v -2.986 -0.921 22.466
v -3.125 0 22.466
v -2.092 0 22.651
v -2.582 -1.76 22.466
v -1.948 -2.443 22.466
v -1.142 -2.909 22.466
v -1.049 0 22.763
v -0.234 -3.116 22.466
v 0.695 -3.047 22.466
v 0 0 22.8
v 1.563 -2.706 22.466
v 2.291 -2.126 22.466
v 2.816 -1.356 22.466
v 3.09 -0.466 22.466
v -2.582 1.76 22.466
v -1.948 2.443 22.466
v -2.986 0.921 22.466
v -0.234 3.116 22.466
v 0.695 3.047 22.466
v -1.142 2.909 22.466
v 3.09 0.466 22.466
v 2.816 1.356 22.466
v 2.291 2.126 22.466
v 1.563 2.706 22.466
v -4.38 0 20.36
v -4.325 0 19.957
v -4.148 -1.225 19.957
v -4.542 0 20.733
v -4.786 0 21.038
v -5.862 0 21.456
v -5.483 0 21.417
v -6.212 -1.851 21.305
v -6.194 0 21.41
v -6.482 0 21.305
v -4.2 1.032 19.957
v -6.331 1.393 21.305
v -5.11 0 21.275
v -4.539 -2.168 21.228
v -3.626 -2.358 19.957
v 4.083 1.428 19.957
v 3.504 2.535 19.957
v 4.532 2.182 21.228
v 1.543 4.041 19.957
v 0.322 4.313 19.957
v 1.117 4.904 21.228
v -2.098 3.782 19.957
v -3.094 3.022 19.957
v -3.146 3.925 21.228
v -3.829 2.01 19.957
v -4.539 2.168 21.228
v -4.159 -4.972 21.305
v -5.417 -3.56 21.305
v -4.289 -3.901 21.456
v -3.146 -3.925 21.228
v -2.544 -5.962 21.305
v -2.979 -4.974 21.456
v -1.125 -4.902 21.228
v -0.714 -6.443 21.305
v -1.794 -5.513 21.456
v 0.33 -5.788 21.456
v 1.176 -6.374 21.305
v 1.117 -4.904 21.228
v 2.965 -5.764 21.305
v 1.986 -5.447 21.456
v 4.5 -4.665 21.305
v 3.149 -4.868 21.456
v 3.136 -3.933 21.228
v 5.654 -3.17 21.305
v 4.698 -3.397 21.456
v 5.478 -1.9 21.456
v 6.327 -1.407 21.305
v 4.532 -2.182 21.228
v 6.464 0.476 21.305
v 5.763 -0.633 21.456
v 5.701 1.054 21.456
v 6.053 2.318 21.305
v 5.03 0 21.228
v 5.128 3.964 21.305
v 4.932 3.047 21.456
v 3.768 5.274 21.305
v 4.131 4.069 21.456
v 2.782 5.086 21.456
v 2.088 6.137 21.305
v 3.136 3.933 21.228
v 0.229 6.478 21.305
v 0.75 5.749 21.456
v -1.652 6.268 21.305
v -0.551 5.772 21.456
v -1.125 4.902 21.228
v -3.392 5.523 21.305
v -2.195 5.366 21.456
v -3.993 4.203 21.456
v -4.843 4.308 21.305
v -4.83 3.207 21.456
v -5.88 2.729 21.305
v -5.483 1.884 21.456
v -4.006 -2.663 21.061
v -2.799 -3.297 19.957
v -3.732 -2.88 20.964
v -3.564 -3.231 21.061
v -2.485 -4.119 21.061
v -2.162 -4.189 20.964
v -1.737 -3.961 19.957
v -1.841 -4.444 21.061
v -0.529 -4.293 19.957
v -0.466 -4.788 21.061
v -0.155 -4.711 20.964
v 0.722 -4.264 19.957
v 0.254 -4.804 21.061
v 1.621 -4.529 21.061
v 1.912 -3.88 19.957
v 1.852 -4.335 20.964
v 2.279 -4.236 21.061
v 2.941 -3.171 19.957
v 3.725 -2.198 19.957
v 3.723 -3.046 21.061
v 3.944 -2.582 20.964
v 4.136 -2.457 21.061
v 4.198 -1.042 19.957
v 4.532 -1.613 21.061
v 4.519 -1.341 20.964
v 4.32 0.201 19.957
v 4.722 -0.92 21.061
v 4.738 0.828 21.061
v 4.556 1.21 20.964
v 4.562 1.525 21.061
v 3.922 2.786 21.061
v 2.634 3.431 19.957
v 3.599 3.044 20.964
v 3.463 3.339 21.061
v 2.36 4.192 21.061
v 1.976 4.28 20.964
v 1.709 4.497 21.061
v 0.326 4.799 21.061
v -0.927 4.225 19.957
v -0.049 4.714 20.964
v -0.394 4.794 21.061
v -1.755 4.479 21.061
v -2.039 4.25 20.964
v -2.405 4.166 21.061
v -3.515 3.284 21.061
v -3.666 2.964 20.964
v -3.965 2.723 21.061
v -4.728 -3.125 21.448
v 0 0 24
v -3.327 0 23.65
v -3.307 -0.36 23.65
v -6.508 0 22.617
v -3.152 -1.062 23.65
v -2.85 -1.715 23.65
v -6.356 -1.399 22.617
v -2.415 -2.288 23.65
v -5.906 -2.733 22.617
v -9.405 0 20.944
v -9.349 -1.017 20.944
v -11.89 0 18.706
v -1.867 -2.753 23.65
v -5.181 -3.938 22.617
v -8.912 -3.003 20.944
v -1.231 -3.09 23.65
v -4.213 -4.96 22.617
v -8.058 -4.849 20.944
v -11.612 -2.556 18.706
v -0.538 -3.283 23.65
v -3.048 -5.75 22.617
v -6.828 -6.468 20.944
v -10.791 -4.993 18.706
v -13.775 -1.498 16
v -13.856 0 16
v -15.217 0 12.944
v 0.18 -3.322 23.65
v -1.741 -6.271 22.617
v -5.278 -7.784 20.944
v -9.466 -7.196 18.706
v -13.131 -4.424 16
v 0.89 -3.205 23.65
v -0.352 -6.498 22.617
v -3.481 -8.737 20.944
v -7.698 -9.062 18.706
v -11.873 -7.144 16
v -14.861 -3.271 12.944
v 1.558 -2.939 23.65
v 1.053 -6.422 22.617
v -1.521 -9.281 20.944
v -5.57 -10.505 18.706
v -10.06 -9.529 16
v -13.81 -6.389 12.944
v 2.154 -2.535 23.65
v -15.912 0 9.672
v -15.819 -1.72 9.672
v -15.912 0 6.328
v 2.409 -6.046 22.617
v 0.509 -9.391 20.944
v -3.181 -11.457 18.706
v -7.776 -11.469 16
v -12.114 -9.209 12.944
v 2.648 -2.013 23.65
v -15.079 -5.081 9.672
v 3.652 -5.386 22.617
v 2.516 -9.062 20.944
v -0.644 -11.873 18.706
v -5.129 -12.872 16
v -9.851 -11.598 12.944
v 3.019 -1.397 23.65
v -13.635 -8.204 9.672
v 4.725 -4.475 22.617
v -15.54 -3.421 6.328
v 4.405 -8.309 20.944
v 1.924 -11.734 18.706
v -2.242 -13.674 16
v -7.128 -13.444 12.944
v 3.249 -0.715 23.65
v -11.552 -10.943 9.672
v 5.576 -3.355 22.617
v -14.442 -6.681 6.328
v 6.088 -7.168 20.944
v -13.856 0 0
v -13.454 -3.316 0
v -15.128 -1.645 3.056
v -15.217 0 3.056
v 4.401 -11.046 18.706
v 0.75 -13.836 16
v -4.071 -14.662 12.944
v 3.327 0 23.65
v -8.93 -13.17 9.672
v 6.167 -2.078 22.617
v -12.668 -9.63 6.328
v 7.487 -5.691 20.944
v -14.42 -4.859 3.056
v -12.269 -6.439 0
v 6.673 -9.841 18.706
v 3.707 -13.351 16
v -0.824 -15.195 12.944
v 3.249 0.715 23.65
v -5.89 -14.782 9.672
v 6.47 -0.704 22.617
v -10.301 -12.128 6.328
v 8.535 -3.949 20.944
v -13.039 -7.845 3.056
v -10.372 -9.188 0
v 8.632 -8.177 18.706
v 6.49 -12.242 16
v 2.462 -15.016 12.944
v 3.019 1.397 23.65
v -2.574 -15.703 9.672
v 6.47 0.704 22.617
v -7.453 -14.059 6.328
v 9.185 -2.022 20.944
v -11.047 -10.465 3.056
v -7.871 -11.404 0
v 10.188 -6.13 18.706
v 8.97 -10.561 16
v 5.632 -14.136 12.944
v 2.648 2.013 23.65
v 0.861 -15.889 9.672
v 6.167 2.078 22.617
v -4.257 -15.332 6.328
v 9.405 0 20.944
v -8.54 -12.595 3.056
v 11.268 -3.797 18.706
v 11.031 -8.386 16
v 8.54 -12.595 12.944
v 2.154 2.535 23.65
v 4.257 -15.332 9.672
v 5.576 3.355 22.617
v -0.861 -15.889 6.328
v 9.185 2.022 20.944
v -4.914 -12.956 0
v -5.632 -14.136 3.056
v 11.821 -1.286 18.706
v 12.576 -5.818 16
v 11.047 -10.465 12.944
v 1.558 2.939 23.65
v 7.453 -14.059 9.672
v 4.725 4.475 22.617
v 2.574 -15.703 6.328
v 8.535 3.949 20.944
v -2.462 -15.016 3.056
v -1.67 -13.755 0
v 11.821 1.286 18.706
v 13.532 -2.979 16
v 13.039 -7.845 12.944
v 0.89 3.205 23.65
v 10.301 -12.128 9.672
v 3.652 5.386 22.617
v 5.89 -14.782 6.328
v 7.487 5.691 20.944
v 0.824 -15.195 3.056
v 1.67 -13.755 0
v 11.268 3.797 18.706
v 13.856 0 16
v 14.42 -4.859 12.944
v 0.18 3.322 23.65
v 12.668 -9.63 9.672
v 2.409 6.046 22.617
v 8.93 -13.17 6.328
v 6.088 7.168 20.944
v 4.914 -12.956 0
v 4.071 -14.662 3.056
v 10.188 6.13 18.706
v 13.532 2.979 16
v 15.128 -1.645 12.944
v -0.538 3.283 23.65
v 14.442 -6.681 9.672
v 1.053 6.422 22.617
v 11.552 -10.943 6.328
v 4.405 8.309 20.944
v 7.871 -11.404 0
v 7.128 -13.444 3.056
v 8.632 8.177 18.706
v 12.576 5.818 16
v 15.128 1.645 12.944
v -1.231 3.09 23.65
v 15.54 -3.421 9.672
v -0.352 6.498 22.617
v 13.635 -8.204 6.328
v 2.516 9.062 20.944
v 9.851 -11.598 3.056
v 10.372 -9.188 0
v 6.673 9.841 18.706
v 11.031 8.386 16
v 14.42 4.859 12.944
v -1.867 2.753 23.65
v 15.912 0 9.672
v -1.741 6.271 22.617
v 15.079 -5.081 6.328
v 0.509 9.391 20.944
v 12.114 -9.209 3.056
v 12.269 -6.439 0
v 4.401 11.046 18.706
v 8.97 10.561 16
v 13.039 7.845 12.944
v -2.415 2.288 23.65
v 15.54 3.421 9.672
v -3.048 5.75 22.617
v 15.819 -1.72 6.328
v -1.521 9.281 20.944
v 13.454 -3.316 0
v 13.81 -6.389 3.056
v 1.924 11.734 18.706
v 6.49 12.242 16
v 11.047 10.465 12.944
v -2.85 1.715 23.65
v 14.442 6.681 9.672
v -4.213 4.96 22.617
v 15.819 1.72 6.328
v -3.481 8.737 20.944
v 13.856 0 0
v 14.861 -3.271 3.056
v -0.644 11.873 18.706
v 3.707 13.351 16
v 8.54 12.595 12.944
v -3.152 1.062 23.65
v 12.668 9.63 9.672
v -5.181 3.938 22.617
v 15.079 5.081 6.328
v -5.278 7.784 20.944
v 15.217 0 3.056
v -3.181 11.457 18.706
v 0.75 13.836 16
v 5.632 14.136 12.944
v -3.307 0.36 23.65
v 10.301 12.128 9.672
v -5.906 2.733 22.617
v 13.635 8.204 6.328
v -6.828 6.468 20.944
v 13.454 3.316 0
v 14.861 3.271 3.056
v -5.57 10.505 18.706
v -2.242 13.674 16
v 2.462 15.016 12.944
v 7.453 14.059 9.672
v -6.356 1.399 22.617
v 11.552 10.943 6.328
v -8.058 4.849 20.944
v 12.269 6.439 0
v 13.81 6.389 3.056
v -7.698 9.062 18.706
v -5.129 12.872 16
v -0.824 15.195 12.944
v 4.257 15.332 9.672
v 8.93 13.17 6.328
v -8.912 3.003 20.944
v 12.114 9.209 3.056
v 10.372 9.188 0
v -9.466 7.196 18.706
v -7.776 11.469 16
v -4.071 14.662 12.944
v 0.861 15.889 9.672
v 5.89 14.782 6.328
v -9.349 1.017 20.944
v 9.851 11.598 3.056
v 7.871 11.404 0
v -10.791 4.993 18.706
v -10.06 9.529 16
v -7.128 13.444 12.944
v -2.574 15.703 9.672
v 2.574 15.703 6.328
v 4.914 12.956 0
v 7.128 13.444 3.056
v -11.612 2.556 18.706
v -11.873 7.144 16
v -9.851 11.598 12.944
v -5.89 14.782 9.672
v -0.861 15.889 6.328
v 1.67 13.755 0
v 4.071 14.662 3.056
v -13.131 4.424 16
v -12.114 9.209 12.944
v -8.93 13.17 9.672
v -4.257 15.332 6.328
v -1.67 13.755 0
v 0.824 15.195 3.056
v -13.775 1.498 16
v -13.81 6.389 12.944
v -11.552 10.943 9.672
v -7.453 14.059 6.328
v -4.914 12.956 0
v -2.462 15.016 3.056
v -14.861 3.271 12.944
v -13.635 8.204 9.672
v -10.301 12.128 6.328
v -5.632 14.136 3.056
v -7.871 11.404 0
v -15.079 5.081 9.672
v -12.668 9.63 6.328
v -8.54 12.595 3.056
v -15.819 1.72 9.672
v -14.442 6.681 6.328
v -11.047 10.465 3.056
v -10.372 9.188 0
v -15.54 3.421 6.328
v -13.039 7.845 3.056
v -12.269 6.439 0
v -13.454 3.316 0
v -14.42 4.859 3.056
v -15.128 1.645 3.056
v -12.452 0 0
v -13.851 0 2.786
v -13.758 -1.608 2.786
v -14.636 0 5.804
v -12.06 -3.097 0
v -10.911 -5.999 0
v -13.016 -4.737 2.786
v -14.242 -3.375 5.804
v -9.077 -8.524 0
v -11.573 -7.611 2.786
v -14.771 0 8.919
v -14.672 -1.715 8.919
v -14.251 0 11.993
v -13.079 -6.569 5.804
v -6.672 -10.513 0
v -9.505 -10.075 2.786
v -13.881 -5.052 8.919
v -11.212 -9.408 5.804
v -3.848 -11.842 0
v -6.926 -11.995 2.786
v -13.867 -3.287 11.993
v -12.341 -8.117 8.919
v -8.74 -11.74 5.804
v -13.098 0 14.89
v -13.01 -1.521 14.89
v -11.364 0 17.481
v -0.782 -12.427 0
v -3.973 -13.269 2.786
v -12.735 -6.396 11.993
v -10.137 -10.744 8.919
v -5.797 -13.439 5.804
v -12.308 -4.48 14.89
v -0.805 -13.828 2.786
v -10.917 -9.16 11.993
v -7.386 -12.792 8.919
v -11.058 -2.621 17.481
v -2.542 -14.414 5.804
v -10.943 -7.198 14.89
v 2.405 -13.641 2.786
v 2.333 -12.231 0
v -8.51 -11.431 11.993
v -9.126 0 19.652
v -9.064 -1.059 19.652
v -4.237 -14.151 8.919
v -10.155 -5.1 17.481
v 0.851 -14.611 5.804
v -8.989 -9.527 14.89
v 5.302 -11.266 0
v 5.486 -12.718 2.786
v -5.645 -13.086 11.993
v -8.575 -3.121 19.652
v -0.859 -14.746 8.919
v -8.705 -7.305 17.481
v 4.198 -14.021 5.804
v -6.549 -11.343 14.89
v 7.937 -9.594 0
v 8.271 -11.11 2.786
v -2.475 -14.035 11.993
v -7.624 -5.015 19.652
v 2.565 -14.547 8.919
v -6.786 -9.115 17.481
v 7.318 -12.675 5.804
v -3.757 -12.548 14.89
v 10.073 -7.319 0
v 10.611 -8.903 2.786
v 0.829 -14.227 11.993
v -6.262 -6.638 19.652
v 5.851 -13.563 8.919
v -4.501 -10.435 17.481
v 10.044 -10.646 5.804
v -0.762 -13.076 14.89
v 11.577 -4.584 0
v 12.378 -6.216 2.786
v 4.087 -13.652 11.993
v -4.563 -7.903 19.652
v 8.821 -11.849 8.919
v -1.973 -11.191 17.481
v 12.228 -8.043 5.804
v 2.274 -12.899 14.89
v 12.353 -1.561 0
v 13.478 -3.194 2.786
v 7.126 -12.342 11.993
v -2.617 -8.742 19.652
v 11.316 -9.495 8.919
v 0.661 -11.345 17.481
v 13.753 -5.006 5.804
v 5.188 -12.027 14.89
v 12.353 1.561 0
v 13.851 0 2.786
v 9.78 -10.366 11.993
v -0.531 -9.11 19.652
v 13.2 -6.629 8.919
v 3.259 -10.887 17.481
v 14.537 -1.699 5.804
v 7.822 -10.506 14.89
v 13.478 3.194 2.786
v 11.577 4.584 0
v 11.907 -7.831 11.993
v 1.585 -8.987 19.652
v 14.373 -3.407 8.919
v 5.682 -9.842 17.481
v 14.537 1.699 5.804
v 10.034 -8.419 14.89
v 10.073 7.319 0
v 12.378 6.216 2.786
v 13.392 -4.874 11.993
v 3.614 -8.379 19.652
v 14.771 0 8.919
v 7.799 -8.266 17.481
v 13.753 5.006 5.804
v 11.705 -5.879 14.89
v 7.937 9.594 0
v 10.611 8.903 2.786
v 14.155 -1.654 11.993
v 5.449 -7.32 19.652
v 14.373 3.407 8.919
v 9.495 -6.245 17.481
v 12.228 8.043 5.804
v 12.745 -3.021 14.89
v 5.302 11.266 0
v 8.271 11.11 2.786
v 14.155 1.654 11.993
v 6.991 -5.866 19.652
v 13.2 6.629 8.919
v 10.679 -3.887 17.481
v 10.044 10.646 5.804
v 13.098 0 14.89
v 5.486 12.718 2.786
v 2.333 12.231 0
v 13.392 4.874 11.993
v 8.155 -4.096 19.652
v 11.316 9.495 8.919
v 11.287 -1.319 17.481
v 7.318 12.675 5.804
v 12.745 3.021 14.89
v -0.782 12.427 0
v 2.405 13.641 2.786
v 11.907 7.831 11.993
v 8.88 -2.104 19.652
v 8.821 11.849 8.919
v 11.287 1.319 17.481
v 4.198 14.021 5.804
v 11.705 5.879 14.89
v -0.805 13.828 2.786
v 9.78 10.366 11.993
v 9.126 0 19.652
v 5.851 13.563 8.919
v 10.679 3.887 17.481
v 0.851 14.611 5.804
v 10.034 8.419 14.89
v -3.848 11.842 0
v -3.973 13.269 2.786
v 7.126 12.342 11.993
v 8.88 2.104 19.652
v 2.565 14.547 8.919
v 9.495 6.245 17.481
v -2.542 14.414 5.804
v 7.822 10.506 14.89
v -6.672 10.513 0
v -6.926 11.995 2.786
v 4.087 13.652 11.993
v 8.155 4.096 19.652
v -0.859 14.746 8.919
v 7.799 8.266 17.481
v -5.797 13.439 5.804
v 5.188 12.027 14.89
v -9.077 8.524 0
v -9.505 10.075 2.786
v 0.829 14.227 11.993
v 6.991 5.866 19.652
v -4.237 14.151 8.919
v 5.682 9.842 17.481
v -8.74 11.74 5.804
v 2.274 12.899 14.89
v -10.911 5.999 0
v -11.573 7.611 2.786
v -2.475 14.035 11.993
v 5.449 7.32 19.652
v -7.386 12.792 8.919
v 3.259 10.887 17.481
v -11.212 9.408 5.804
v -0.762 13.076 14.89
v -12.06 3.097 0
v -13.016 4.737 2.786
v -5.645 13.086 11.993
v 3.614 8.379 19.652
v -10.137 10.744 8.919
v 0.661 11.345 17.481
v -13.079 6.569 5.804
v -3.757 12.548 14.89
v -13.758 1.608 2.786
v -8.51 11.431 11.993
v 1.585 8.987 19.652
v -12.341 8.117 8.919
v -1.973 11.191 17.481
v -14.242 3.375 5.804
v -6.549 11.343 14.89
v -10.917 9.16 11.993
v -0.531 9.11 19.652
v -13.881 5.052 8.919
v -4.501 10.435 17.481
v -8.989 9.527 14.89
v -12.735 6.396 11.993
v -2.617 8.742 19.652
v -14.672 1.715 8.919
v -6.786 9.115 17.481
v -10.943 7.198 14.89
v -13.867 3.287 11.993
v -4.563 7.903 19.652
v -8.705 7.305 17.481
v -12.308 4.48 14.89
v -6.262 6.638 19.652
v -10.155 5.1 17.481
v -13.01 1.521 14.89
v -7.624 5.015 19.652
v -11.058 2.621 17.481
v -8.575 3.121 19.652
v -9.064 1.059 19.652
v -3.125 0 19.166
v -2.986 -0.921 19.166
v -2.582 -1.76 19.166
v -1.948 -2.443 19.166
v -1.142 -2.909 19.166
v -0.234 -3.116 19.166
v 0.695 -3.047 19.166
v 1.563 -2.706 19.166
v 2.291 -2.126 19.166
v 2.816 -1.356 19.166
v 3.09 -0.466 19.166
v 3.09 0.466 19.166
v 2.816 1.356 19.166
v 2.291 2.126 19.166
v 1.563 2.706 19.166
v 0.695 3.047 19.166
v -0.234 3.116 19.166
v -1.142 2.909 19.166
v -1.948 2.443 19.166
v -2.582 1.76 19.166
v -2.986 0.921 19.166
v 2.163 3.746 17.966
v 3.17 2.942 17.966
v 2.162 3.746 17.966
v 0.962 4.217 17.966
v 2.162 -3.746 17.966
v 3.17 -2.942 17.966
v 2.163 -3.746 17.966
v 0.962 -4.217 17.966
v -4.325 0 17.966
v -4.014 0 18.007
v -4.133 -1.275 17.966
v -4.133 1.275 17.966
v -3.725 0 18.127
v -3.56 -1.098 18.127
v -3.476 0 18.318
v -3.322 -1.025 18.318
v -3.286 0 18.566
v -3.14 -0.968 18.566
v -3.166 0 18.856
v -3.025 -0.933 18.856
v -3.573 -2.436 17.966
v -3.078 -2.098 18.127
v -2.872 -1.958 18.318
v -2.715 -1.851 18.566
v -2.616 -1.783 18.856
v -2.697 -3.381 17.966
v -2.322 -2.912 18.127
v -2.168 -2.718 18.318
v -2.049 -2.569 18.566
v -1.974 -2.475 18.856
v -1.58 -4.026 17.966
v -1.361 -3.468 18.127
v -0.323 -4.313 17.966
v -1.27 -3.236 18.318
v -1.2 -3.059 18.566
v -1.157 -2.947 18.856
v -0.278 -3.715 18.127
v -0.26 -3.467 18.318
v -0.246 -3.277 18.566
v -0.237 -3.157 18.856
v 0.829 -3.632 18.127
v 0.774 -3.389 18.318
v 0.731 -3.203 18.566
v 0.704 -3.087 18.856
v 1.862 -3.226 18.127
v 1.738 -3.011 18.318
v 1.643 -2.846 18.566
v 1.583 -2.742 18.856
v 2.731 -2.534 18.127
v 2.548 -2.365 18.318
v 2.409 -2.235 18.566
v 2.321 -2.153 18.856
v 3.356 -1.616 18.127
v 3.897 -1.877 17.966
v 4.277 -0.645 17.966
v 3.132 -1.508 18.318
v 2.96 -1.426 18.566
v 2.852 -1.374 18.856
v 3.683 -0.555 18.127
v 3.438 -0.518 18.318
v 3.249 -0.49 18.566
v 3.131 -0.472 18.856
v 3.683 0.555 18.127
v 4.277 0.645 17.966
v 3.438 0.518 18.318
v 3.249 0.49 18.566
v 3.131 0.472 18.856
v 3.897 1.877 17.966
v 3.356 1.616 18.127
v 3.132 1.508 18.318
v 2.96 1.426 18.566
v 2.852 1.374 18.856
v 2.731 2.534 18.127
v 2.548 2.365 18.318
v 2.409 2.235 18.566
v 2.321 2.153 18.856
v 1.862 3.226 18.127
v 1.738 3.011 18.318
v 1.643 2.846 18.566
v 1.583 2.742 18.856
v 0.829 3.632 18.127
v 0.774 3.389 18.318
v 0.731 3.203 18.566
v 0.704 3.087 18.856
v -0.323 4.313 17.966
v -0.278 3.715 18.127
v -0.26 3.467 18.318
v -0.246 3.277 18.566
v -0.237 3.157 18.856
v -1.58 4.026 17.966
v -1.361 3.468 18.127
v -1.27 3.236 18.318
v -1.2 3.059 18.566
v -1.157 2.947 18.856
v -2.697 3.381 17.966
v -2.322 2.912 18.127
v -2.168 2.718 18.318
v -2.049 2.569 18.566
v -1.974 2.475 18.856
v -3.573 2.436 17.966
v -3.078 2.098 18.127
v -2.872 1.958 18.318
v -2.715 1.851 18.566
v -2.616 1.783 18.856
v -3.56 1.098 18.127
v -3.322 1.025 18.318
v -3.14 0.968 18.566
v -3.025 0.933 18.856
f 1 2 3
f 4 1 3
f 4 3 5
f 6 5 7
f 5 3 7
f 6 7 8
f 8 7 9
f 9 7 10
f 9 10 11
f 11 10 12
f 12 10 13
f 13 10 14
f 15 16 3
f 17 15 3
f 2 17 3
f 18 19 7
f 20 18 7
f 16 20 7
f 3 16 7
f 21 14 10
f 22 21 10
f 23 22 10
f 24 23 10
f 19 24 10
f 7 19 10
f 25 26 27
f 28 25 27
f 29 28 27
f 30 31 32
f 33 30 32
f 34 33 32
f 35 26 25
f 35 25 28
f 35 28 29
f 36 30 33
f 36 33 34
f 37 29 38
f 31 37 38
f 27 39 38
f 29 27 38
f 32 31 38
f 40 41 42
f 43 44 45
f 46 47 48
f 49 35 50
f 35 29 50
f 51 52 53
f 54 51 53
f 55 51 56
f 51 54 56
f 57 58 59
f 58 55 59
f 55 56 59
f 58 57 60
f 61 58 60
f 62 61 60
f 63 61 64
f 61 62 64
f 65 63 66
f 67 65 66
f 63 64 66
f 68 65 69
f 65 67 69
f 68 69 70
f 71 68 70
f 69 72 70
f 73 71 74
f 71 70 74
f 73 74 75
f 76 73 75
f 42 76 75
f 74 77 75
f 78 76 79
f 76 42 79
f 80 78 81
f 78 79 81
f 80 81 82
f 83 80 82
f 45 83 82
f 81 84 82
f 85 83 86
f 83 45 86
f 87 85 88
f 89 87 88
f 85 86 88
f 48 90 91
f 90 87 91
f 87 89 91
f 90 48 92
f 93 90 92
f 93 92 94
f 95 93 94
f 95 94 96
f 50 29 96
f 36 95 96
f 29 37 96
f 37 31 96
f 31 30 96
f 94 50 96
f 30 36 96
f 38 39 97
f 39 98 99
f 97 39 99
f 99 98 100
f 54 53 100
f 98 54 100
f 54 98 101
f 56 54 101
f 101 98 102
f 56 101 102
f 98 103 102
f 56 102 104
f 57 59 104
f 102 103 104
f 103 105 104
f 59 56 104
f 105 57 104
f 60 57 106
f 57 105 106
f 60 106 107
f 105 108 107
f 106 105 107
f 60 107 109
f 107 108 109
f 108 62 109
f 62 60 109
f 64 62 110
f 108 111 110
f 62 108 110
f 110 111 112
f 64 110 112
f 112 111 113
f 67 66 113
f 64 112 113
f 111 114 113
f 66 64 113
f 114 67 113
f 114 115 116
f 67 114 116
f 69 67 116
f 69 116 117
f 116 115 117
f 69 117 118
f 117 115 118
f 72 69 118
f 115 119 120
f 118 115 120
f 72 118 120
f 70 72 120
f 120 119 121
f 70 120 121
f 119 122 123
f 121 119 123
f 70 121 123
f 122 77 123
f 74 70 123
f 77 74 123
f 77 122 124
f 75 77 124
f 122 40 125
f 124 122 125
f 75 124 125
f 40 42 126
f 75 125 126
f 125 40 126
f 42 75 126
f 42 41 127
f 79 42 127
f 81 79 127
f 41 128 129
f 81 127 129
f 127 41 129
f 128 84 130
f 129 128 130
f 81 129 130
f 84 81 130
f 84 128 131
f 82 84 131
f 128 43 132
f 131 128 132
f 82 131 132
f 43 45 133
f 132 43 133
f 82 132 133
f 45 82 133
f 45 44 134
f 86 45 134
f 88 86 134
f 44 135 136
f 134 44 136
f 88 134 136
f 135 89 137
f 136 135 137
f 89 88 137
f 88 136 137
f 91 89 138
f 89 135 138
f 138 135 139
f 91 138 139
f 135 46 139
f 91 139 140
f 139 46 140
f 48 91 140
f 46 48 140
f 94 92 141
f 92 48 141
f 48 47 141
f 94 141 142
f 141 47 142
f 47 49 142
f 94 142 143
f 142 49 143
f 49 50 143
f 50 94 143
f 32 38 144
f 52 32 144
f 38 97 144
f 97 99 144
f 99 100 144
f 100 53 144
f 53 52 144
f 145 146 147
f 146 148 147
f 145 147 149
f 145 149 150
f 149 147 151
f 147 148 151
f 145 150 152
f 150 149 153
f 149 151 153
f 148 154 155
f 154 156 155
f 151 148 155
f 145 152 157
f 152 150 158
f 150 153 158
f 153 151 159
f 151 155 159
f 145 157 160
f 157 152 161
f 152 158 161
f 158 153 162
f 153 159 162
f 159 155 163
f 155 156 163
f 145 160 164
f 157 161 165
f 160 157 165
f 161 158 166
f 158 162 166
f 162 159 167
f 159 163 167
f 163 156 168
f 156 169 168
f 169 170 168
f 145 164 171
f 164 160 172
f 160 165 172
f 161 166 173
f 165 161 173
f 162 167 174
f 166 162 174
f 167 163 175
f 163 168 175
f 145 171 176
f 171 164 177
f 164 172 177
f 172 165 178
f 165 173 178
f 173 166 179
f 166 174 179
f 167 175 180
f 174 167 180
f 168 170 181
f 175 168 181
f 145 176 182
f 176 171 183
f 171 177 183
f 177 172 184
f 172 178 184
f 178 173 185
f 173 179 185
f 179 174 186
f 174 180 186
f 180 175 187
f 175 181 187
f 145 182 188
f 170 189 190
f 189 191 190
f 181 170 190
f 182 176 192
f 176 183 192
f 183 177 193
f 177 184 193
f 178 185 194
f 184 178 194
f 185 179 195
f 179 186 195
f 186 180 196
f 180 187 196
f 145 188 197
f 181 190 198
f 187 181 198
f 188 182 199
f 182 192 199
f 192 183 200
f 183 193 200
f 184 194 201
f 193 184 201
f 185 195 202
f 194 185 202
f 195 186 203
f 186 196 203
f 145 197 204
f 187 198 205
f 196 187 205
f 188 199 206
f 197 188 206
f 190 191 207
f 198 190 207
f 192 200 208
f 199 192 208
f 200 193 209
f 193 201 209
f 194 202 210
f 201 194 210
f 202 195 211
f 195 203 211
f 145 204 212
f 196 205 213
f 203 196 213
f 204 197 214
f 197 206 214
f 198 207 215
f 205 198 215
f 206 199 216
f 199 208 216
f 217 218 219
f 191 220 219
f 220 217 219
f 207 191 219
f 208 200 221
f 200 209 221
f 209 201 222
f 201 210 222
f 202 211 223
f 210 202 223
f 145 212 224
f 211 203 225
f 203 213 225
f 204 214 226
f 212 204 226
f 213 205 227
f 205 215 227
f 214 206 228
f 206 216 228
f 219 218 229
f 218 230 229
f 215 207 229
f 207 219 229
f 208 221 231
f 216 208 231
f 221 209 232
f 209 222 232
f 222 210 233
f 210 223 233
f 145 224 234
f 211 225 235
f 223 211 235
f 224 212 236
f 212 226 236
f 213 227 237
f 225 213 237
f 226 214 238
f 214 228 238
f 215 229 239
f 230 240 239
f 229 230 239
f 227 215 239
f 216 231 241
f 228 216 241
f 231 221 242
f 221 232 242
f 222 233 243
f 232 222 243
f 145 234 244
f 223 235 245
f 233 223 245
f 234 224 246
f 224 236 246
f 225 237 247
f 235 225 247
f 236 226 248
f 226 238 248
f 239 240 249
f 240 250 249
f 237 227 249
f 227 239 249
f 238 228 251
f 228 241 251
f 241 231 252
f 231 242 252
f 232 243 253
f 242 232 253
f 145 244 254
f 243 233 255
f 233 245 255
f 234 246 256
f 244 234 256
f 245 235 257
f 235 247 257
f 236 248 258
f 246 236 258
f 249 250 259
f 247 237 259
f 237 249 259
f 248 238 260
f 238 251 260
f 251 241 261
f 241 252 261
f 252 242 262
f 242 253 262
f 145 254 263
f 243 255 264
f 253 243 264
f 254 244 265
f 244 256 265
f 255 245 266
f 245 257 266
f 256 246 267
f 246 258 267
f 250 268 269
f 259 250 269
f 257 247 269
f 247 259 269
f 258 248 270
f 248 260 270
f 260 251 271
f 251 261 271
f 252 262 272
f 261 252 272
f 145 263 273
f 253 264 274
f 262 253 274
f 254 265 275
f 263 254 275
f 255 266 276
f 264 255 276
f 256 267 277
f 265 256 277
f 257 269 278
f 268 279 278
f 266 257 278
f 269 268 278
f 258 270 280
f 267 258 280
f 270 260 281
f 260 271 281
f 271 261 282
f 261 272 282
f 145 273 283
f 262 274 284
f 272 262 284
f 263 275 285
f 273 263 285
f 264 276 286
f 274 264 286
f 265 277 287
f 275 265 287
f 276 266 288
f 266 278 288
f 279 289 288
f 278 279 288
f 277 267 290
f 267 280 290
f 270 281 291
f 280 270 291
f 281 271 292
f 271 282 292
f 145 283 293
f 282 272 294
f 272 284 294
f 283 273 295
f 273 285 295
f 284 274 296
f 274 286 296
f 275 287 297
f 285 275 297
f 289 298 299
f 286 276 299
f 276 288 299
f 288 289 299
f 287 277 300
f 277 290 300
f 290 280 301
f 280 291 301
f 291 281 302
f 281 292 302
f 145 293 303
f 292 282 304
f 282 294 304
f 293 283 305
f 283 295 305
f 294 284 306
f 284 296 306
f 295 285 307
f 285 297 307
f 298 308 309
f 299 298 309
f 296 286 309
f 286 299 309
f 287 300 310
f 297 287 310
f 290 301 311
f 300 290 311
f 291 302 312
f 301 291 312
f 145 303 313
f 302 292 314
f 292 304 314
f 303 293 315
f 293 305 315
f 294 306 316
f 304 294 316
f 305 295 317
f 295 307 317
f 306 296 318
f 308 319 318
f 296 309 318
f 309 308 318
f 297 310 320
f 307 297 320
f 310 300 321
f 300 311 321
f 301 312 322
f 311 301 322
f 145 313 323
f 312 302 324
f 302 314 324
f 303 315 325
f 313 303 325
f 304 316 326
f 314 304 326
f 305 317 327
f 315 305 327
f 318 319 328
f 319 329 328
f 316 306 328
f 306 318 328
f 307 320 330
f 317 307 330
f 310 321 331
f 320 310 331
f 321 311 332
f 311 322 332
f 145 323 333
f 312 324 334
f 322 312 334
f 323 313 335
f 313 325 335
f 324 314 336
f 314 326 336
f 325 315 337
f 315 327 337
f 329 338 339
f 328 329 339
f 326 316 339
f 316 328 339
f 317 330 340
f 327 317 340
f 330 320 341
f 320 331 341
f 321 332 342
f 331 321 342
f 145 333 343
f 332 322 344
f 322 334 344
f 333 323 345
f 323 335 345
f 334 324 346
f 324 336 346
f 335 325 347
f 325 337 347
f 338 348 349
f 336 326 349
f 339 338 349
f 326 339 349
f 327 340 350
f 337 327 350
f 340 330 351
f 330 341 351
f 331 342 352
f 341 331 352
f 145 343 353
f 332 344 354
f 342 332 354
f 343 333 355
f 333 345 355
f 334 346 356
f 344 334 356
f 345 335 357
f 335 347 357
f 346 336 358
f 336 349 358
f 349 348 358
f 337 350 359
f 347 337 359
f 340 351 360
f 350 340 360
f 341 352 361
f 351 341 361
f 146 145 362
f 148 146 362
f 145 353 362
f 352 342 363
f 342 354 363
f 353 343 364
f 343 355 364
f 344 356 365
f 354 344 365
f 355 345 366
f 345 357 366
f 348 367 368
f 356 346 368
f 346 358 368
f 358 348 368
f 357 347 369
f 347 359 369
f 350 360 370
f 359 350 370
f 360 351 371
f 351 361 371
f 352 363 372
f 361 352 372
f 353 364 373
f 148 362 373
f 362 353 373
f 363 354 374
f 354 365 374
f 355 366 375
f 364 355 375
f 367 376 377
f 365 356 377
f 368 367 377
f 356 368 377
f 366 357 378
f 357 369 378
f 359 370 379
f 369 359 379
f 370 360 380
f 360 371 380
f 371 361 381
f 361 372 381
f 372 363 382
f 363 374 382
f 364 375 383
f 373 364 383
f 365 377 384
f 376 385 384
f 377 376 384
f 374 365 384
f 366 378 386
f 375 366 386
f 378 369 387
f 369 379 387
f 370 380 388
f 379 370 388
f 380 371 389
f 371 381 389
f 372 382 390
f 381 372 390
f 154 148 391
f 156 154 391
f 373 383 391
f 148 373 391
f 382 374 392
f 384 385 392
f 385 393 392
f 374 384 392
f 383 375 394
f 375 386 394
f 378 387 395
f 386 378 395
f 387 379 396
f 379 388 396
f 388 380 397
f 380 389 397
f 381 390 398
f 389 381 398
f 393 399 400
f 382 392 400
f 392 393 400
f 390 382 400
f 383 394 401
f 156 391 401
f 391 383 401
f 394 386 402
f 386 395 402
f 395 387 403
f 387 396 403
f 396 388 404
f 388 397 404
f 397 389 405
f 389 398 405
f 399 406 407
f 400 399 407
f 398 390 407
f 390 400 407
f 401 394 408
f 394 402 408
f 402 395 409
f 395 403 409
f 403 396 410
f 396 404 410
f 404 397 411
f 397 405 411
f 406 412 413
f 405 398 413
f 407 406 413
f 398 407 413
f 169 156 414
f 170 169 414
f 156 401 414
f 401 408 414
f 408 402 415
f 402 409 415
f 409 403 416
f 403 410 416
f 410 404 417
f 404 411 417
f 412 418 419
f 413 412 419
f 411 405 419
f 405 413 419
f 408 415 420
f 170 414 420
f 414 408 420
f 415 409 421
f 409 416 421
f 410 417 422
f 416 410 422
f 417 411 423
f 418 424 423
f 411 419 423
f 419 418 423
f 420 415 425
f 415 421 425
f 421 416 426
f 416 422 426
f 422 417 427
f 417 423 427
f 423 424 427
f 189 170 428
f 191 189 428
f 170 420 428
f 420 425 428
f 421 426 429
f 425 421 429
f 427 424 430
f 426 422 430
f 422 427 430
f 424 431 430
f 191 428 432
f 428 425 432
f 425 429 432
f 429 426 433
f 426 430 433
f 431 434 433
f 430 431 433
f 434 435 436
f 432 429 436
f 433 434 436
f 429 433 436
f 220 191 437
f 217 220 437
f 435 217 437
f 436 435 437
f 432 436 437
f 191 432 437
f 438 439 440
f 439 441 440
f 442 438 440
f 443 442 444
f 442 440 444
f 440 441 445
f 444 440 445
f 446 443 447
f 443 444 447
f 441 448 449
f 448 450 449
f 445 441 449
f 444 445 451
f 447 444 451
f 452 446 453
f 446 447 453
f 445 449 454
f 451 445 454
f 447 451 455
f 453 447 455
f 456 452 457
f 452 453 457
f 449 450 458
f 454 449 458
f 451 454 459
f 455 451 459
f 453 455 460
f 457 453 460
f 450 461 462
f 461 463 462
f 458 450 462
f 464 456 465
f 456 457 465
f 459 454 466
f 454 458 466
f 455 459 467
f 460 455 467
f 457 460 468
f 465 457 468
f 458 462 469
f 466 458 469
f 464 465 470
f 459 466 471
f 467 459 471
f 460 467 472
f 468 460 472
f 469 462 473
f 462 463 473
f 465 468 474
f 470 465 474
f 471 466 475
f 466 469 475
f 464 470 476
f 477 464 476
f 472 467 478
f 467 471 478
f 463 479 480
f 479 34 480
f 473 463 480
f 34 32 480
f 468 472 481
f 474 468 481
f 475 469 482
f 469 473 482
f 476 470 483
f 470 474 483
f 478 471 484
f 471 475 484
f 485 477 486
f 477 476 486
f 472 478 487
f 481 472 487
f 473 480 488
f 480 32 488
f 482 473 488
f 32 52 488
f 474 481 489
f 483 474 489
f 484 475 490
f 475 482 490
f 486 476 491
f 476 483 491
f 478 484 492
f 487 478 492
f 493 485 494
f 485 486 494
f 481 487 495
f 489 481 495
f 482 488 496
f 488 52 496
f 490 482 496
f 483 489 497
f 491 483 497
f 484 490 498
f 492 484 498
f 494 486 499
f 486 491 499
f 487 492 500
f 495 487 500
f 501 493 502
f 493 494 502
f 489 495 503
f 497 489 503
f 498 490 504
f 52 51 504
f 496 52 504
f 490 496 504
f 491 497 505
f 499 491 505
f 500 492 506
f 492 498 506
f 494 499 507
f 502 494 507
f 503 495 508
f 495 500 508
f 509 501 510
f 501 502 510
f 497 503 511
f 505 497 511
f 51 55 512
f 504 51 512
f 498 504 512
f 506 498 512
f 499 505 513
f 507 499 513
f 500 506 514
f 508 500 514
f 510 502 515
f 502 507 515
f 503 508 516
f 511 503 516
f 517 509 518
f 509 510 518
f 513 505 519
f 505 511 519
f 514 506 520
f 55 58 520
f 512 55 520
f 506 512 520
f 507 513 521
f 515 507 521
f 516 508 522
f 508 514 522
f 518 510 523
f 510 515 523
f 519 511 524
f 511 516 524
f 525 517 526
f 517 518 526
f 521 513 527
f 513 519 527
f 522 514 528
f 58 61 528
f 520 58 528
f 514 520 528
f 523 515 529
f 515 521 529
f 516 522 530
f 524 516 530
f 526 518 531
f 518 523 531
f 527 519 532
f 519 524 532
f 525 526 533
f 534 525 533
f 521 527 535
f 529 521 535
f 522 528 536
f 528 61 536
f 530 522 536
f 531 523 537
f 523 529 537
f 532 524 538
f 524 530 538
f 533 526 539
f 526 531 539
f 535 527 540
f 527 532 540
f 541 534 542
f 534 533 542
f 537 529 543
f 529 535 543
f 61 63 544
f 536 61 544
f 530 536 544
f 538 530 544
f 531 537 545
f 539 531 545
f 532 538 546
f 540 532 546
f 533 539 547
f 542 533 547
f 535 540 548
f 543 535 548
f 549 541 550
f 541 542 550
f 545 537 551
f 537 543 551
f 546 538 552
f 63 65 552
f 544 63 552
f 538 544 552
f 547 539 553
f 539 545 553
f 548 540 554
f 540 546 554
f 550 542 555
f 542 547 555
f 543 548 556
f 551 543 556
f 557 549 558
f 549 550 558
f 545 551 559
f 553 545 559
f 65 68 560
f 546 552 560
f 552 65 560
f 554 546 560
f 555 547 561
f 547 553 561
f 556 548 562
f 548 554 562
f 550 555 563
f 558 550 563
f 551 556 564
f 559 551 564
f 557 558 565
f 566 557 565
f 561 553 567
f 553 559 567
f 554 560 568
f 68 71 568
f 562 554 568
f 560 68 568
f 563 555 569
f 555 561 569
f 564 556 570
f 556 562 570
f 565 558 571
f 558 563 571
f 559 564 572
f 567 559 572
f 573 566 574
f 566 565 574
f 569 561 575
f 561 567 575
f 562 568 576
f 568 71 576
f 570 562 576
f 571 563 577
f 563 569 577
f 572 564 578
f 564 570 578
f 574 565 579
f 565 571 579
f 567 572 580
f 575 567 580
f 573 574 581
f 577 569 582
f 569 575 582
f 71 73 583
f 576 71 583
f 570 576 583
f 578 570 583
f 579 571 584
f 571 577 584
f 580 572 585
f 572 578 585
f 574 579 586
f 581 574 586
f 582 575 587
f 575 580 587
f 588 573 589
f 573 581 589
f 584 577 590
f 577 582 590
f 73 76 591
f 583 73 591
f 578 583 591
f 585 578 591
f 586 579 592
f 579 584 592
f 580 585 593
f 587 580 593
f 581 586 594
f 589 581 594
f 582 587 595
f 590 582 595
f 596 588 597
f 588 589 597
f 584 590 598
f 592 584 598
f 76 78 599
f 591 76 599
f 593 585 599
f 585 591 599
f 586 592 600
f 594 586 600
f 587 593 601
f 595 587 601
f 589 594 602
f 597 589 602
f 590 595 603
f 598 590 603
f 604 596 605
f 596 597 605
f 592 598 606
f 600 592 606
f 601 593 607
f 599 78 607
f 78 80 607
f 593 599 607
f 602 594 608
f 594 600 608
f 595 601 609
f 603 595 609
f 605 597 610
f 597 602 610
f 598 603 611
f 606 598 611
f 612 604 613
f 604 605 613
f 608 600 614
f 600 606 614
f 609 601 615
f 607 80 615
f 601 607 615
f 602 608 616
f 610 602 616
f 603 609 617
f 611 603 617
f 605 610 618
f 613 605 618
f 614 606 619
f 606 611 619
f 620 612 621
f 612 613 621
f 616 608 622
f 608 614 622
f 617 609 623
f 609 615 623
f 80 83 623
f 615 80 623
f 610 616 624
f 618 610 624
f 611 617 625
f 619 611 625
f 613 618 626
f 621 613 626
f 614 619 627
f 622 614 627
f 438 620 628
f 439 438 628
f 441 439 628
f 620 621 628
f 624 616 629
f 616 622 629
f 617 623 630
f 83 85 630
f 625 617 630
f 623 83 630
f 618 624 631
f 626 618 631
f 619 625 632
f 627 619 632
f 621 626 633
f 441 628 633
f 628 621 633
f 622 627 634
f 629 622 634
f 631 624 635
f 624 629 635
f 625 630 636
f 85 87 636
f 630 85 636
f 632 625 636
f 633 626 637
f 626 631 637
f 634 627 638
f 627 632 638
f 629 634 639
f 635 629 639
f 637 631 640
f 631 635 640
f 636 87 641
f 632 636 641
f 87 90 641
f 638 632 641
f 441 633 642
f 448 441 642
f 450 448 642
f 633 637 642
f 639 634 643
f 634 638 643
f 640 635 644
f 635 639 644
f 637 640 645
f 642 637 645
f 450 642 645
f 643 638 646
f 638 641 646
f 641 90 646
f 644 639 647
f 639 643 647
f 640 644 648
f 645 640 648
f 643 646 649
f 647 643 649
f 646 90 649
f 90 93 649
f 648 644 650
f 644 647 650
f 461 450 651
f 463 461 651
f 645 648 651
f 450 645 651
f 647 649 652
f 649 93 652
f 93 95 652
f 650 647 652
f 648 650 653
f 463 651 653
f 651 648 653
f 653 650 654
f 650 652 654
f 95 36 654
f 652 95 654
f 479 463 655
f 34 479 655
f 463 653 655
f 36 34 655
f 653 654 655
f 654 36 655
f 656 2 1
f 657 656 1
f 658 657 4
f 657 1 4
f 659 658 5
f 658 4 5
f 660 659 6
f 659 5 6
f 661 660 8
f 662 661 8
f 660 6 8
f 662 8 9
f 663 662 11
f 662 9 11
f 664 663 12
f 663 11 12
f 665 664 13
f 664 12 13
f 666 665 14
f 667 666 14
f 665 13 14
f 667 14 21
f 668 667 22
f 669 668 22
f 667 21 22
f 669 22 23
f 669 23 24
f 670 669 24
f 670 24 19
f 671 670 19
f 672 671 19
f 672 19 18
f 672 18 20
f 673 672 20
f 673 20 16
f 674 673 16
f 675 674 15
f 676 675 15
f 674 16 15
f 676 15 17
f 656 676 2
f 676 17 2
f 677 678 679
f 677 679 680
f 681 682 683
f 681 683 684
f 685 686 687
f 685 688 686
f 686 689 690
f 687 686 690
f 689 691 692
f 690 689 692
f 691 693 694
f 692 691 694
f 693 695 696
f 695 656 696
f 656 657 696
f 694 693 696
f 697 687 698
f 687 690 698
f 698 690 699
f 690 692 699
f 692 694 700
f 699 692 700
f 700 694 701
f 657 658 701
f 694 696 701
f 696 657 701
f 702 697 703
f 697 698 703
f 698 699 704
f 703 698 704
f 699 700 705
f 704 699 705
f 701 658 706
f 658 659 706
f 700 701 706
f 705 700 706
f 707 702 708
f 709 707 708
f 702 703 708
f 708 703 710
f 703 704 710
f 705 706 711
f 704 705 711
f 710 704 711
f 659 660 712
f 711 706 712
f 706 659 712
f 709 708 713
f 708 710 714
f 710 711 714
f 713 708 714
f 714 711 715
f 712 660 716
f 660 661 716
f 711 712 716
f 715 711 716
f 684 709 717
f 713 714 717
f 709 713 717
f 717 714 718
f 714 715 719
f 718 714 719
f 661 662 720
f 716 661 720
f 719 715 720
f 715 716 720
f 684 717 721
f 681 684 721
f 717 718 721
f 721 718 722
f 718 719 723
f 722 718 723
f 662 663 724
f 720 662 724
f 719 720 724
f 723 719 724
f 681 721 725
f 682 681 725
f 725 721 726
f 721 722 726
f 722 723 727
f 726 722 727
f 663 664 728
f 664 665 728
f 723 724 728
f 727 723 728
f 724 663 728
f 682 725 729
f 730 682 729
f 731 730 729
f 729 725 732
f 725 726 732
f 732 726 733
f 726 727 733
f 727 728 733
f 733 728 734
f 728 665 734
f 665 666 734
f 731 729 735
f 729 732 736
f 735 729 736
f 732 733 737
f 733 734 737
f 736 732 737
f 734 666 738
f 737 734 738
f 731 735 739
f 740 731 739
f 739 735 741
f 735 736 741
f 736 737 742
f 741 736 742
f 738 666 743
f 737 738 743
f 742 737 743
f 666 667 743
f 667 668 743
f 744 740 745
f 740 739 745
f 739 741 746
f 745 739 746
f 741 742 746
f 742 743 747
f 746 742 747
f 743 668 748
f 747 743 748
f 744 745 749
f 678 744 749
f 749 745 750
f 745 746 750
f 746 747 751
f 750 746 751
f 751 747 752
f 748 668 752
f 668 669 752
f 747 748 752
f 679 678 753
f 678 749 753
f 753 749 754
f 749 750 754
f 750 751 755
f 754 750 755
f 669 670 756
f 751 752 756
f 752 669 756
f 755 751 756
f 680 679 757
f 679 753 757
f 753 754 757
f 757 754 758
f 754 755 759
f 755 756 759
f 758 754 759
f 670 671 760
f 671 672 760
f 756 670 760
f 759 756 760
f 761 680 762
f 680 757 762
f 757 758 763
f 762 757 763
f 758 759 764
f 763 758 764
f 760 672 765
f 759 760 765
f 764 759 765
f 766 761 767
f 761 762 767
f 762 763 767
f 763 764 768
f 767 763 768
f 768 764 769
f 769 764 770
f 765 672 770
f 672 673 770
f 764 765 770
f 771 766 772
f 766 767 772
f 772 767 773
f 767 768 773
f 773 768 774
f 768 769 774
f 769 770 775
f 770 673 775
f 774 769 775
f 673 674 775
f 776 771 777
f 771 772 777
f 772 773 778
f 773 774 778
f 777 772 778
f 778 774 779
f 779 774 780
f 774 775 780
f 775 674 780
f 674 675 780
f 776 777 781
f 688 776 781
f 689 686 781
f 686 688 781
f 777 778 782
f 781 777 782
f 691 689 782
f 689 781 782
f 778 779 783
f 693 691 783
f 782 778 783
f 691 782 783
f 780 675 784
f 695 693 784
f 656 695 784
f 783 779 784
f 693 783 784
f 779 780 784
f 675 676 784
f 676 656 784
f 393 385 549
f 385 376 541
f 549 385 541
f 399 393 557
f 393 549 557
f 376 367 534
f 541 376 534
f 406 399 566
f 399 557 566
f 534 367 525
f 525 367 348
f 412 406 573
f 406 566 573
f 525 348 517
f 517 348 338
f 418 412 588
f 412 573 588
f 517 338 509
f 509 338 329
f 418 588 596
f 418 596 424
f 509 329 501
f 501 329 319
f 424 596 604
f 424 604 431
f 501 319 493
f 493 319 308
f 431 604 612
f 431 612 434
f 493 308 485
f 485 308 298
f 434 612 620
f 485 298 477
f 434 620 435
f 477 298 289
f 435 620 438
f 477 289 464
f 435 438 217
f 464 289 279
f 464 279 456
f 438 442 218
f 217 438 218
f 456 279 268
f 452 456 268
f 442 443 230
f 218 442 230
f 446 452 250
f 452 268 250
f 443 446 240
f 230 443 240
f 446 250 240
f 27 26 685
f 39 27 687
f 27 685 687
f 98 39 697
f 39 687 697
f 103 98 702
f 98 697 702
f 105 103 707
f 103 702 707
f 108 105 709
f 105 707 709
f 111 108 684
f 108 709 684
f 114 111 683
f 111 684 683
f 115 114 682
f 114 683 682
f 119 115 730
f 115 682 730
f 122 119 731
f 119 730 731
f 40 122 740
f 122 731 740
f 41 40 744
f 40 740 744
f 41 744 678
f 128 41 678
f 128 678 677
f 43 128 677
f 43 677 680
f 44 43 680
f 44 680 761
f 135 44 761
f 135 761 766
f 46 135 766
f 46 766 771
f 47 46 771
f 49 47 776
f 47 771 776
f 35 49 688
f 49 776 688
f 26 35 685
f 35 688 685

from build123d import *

# Parameters (mm, degrees)
F2_R = 1.19999
F3_R = 1.5


# Not quite as in the source:
# - a fillet or chamfer is up to 0.001 mm smaller than in the source, because OpenCascade refuses the exact size


with BuildPart() as f1:
    # F0 (on Front) → F1 (revolve)
    with BuildSketch(Plane.XZ):
        with BuildLine():
            Line((0, 22.8), (0, 24))
            ThreePointArc((0, 24), (-13.8564064606, 16), (-13.8564064606, 0))
            Line((-13.8564064606, 0), (-12.451505933, 0))
            ThreePointArc((-12.451505933, 0), (-13.8946821516, 13.0968429353), (-4.325, 22.1539526282))
            ThreePointArc((-4.325, 22.1539526282), (-3.7282728081, 22.322708608), (-3.125, 22.4663186402))
            ThreePointArc((-3.125, 22.4663186402), (-1.571382214, 22.7163432257), (0, 22.8))
        make_face()
        with BuildLine():
            Line((-3.125, 17.9663186402), (-3.125, 22.4663186402))
            ThreePointArc((-3.125, 22.4663186402), (-3.7282728081, 22.322708608), (-4.325, 22.1539526282))
            Line((-4.325, 22.1539526282), (-4.325, 17.9663186402))
            Line((-4.325, 17.9663186402), (-3.125, 17.9663186402))
        make_face()
    revolve(axis=Axis((0, 0, 23.4), (0, 0, 1)))

    # F2 (radius 1.2 in the source; OpenCascade refuses exactly that, so slightly less here)
    f2_edges = [f1.edges().sort_by_distance(p)[0] for p in [
        (3.125, 0, 17.966319),
    ]]
    fillet(f2_edges, radius=F2_R)

    # F3
    f3_edges = [f1.edges().sort_by_distance(p)[0] for p in [
        (4.325, 0, 22.153953),
    ]]
    fillet(f3_edges, radius=F3_R)


solid = f1.part
